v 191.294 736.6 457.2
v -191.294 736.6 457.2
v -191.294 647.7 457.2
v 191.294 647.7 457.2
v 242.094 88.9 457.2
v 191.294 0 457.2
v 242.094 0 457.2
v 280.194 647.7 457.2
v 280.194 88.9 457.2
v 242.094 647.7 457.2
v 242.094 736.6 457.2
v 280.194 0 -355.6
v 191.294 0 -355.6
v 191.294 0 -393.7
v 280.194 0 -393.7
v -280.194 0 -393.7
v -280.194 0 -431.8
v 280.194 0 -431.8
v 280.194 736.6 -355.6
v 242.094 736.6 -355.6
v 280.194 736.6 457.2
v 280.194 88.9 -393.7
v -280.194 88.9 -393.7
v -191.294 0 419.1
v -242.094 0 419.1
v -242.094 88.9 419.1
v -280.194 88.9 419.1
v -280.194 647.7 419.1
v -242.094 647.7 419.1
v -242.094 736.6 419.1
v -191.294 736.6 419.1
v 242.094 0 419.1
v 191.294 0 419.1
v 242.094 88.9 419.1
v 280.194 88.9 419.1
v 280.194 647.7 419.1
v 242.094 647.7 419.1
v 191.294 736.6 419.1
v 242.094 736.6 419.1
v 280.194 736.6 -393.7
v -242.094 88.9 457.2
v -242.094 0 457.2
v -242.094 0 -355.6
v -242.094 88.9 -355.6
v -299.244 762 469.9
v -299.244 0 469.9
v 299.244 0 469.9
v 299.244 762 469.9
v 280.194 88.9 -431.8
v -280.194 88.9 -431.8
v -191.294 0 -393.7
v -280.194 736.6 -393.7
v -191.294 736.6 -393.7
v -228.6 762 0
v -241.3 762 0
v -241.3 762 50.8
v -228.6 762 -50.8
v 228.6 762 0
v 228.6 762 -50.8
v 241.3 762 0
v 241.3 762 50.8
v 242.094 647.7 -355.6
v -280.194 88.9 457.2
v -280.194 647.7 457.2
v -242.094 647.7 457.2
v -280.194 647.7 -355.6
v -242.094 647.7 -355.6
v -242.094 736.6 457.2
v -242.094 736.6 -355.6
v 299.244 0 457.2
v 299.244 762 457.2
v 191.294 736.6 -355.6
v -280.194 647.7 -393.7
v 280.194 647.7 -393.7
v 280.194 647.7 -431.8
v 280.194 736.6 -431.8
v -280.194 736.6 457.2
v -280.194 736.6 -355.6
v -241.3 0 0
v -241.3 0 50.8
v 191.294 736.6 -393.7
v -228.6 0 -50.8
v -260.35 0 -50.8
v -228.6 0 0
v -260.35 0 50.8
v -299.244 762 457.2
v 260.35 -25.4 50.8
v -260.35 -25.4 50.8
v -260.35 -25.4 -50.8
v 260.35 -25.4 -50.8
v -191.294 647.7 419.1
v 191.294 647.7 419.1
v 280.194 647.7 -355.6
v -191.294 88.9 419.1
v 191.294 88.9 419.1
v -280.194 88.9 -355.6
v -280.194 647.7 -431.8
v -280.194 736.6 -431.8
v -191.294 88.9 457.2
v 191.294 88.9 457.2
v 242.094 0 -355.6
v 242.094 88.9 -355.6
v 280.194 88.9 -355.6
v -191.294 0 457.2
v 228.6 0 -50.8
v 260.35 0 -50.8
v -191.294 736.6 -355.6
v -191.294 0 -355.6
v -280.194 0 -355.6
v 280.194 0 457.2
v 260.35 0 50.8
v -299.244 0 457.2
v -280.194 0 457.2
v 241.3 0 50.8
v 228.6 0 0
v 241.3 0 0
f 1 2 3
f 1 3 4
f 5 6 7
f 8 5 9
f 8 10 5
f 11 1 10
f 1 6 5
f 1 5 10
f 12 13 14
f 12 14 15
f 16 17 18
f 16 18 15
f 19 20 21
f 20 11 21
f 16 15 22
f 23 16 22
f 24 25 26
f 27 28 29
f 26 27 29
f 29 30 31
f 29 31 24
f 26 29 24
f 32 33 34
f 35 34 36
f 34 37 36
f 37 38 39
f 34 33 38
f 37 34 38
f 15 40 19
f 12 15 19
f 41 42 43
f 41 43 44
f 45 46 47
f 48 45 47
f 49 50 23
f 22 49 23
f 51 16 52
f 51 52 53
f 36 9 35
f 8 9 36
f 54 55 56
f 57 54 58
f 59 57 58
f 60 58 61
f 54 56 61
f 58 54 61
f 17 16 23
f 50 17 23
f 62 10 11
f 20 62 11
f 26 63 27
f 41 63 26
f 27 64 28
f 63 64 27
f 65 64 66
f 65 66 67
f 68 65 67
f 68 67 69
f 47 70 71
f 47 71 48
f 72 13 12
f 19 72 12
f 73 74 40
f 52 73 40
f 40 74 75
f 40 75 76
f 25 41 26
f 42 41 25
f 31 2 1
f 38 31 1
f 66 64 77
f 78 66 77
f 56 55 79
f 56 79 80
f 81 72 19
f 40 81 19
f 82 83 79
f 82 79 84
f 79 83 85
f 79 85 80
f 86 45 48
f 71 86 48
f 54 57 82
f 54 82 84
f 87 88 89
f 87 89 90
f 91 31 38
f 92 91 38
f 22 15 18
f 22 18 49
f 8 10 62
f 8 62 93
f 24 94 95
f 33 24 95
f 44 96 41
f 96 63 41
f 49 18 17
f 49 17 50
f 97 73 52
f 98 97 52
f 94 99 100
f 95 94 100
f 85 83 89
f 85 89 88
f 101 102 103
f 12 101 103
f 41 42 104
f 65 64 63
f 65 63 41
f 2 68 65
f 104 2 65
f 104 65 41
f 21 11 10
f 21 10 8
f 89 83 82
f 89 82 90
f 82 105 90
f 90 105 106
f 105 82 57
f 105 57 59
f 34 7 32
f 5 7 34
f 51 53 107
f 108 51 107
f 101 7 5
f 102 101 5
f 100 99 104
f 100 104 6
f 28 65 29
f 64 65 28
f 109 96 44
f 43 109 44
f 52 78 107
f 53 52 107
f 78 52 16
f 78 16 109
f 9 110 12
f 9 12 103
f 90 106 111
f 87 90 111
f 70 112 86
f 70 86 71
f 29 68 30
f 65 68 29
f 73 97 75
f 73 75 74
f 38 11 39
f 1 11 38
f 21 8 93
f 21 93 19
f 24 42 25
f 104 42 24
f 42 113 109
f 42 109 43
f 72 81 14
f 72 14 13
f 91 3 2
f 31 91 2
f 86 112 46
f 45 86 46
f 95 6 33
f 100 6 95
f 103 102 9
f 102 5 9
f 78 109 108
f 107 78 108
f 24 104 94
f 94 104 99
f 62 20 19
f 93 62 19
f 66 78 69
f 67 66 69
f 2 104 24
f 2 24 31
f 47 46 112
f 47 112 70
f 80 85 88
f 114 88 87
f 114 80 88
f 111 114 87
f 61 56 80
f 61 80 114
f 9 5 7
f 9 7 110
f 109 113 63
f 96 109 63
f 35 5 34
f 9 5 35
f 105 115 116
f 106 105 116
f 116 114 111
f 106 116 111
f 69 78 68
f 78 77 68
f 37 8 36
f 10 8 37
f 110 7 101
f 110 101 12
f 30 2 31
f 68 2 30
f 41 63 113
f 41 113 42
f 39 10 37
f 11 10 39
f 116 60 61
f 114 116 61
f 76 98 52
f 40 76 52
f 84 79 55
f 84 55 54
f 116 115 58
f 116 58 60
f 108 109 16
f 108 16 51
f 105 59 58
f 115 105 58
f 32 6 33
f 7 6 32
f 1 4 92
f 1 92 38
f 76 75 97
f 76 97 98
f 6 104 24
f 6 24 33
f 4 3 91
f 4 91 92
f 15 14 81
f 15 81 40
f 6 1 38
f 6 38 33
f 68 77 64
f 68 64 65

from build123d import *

# Parameters (mm, degrees)
F0_W      = 457.2
F0_H      = 50.8
F0_W_2    = 12.7
F1_DEPTH  = 762
F2_W      = 520.7
F2_H      = 101.6
F3_DEPTH  = 25.4
F4_W      = 38.1
F4_H      = 88.9
F5_DEPTH  = 406.4
F6_W      = 88.9
F6_H      = 38.1
F7_DEPTH  = 736.6
F8_W      = 88.9
F8_H      = 38.1
F9_DEPTH  = 560.3875
F11_DEPTH = 38.1
F10_W     = 382.5875
F10_H     = 88.9
F12_DEPTH = 38.1
F13_W     = 598.4875
F13_H     = 12.7
F14_DEPTH = 762


with BuildPart() as f1:
    # F0 (on Front) → F1 (new body)
    with BuildSketch(Plane.XZ):
        with Locations((0, 25.4)):
            Rectangle(F0_W, F0_H)
        with Locations((234.95, 25.4)):
            Rectangle(F0_W_2, F0_H)
        with Locations((-234.95, 25.4)):
            Rectangle(F0_W_2, F0_H)
        with Locations((0, -25.4)):
            Rectangle(F0_W, F0_H)
    extrude(amount=-F1_DEPTH)

    # F2 (on face) → F3 (join)
    with BuildSketch(Plane.XZ):
        Rectangle(F2_W, F2_H)
    extrude(amount=F3_DEPTH)


with BuildPart() as f5:
    # F4 (on face) → F5 (new body, symmetric)
    with BuildSketch(Plane.XY.offset(50.8)):
        with Locations((-261.14375, 44.45)):
            Rectangle(F4_W, F4_H)
    extrude(amount=F5_DEPTH, both=True)


with BuildPart() as f5b:
    # F4 (on face) → F5, piece 2 (new body, symmetric)
    with BuildSketch(Plane.XY.offset(50.8)):
        with Locations((-261.14375, 692.15)):
            Rectangle(F4_W, F4_H)
    extrude(amount=F5_DEPTH, both=True)


with BuildPart() as f5c:
    # F4 (on face) → F5, piece 3 (new body, symmetric)
    with BuildSketch(Plane.XY.offset(50.8)):
        with Locations((261.14375, 692.15)):
            Rectangle(F4_W, F4_H)
    extrude(amount=F5_DEPTH, both=True)


with BuildPart() as f5d:
    # F4 (on face) → F5, piece 4 (new body, symmetric)
    with BuildSketch(Plane.XY.offset(50.8)):
        with Locations((261.14375, 44.45)):
            Rectangle(F4_W, F4_H)
    extrude(amount=F5_DEPTH, both=True)


with BuildPart() as f7:
    # F6 (on face) → F7 (new body, through all)
    with BuildSketch(Plane.XZ):
        with Locations((-235.74375, -374.65)):
            Rectangle(F6_W, F6_H)
    extrude(amount=-F7_DEPTH)


with BuildPart() as f7b:
    # F6 (on face) → F7, piece 2 (new body, through all)
    with BuildSketch(Plane.XZ):
        with Locations((235.74375, -374.65)):
            Rectangle(F6_W, F6_H)
    extrude(amount=-F7_DEPTH)


with BuildPart() as f9:
    # F8 (on face) → F9 (new body, through all)
    with BuildSketch(Plane.YZ.offset(280.19375)):
        with Locations((44.45, -412.75)):
            Rectangle(F8_W, F8_H)
    extrude(amount=-F9_DEPTH)


with BuildPart() as f9b:
    # F8 (on face) → F9, piece 2 (new body, through all)
    with BuildSketch(Plane.YZ.offset(280.19375)):
        with Locations((692.15, -412.75)):
            Rectangle(F8_W, F8_H)
    extrude(amount=-F9_DEPTH)


with BuildPart() as f11:
    # F10 (on face) → F11 (new body)
    with BuildSketch(Plane.XY.offset(457.2)):
        Polygon((-242.09375, 647.7), (-280.19375, 647.7), (-280.19375, 88.9), (-242.09375, 88.9), (-242.09375, 0), (-191.29375, 0), (-191.29375, 88.9), (-191.29375, 647.7), (-191.29375, 736.6), (-242.09375, 736.6), align=None)
    extrude(amount=-F11_DEPTH)


with BuildPart() as f11b:
    # F10 (on face) → F11, piece 2 (new body)
    with BuildSketch(Plane.XY.offset(457.2)):
        Polygon((242.09375, 736.6), (191.29375, 736.6), (191.29375, 647.7), (191.29375, 88.9), (191.29375, 0), (242.09375, 0), (242.09375, 88.9), (280.19375, 88.9), (280.19375, 647.7), (242.09375, 647.7), align=None)
    extrude(amount=-F11_DEPTH)


with BuildPart() as f12:
    # F10 (on face) → F12 (new body)
    with BuildSketch(Plane.XY.offset(457.2)):
        with Locations((0, 692.15)):
            Rectangle(F10_W, F10_H)
    extrude(amount=-F12_DEPTH)


with BuildPart() as f12b:
    # F10 (on face) → F12, piece 2 (new body)
    with BuildSketch(Plane.XY.offset(457.2)):
        with Locations((0, 44.45)):
            Rectangle(F10_W, F10_H)
    extrude(amount=-F12_DEPTH)


with BuildPart() as f14:
    # F13 (on face) → F14 (new body)
    with BuildSketch(Plane.XZ):
        with Locations((0, 463.55)):
            Rectangle(F13_W, F13_H)
    extrude(amount=-F14_DEPTH)


solid = Compound([f1.part, f5.part, f5b.part, f5c.part, f5d.part, f7.part, f7b.part, f9.part, f9b.part, f11.part, f11b.part, f12.part, f12b.part, f14.part])
